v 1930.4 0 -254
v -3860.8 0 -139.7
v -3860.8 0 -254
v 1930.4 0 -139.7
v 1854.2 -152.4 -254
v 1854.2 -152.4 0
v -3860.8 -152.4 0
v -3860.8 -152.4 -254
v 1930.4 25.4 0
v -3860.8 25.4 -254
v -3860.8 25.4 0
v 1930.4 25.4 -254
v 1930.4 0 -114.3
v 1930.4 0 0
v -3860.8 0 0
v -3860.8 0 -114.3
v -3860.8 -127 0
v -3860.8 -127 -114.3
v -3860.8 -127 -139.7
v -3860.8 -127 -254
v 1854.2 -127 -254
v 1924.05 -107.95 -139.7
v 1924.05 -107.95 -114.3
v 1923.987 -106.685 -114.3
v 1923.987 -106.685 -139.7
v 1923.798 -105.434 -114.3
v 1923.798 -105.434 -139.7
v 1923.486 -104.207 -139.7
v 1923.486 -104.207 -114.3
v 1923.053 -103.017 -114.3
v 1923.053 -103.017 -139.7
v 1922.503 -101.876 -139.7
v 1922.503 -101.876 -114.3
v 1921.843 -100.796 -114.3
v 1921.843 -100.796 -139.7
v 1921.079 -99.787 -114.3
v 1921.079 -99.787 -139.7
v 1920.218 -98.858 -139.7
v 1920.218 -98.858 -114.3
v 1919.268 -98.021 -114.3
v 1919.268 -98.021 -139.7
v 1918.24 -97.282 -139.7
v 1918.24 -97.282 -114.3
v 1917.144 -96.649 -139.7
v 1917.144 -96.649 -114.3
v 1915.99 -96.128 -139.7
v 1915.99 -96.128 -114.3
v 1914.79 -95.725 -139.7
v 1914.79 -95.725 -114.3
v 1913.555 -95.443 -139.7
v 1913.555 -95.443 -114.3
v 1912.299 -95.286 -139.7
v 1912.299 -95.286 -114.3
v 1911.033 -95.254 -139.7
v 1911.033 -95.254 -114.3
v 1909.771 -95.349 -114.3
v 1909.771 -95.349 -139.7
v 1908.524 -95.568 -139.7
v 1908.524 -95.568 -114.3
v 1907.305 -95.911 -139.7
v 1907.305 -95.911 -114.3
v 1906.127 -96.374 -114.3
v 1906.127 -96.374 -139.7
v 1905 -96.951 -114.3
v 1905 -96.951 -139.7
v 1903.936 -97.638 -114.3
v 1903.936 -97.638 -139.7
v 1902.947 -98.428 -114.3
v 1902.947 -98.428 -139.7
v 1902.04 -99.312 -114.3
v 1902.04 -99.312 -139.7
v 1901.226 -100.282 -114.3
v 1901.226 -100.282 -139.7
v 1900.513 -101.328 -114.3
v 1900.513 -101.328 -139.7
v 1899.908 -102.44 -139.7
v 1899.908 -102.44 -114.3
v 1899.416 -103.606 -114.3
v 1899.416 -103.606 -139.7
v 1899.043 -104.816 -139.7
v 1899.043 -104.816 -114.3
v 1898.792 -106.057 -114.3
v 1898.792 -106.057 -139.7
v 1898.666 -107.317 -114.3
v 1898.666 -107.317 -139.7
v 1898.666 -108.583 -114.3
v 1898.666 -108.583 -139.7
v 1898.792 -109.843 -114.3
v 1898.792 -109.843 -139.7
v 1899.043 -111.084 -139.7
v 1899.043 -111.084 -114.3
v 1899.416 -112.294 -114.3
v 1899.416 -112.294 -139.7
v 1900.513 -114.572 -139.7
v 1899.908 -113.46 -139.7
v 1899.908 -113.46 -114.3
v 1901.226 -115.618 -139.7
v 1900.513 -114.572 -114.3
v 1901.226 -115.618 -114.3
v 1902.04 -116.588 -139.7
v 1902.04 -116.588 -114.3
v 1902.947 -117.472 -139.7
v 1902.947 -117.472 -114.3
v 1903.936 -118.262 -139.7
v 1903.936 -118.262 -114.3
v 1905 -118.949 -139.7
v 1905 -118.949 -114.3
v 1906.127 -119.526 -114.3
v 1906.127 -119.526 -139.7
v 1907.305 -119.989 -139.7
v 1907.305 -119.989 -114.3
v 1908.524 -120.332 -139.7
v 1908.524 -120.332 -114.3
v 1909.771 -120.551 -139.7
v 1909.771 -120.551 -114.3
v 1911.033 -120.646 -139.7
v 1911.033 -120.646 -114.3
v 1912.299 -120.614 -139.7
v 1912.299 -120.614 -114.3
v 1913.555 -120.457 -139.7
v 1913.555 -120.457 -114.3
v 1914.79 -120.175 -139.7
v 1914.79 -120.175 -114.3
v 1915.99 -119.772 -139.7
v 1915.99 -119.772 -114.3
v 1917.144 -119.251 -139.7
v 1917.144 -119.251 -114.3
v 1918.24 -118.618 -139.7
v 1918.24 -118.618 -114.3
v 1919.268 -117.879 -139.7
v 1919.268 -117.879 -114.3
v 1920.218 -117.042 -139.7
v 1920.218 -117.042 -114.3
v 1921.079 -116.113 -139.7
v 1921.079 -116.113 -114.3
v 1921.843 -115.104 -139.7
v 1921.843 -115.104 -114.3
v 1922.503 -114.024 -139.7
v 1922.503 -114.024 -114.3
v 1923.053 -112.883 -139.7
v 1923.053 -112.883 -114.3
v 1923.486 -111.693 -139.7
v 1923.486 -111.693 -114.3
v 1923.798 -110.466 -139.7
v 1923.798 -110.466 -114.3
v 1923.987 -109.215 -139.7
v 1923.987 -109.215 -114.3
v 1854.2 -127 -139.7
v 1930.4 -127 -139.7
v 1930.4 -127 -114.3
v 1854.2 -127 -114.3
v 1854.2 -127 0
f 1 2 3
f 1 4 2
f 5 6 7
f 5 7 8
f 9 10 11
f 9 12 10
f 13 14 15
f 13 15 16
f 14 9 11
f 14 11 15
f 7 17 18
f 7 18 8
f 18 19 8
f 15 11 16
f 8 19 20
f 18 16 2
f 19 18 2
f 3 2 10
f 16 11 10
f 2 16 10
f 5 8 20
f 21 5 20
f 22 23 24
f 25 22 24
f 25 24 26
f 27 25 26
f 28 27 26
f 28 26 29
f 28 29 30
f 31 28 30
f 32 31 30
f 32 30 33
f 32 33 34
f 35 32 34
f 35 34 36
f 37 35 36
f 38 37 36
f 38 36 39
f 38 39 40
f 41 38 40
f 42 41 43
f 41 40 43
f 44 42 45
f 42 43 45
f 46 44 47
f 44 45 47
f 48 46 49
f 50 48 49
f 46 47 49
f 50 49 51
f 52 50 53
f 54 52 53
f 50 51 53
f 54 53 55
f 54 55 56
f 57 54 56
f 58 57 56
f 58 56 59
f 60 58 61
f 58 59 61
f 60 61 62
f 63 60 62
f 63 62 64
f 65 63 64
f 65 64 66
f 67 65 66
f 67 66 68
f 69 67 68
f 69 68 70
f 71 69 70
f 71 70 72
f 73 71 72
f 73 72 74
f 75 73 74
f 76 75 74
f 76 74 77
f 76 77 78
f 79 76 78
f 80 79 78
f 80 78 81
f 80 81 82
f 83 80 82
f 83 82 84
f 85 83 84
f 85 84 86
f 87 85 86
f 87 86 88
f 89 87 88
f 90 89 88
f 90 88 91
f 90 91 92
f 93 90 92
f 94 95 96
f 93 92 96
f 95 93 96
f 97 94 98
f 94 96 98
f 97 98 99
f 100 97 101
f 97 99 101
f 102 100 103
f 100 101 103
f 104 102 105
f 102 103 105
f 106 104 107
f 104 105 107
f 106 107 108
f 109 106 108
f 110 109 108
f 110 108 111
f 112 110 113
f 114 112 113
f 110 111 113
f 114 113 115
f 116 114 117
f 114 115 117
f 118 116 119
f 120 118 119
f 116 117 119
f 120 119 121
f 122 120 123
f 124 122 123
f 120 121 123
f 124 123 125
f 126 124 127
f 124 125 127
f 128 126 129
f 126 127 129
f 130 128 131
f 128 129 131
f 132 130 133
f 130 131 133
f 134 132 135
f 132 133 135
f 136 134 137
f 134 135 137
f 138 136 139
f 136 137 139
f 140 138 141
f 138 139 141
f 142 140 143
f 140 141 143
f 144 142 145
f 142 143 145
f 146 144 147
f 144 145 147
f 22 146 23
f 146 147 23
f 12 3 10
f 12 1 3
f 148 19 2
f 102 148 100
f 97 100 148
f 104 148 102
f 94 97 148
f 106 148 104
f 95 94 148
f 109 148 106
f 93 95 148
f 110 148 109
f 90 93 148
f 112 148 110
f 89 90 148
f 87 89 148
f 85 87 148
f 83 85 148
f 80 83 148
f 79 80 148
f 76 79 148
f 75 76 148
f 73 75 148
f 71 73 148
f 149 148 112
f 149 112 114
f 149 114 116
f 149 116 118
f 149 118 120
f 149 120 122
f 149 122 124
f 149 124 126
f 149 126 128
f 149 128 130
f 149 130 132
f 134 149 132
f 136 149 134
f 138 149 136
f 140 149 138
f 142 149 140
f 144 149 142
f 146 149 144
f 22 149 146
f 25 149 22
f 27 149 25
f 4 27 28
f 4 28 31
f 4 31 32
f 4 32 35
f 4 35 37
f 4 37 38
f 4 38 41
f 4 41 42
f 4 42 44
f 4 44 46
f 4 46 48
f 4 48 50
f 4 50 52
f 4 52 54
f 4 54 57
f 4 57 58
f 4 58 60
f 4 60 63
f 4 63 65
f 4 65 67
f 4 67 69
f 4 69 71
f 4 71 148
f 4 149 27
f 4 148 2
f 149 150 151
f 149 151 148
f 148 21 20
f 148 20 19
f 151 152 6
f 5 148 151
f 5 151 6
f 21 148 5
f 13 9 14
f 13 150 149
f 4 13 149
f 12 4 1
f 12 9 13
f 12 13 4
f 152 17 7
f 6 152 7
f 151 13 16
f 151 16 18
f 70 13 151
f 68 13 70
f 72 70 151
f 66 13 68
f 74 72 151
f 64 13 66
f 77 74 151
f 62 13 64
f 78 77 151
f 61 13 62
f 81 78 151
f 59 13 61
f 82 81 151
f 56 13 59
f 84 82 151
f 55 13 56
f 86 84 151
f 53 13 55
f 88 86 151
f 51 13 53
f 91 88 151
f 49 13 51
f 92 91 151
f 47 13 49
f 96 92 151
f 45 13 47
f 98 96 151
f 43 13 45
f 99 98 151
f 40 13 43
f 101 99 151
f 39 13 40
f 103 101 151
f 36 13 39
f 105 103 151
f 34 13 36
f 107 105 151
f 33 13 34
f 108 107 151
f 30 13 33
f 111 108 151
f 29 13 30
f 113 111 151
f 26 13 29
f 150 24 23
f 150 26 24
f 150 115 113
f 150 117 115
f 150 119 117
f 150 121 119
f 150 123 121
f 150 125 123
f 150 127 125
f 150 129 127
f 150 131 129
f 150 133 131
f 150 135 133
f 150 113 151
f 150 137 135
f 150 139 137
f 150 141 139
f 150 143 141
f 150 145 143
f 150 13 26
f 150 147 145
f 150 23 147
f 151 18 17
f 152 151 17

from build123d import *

# Parameters (mm, degrees)
BOSS_EXTRUDE1_DEPTH = 1930.4
CUT_EXTRUDE1_REACH  = 1943.439
SKETCH2_R           = 12.7
SKETCH3_W           = 254
SKETCH3_H           = 25.4
CUT_EXTRUDE2_DEPTH  = 76.2
BOSS_EXTRUDE2_DEPTH = 3860.8


with BuildPart() as part:
    # Sketch1 → Boss-Extrude1 (new body)
    with BuildSketch(Plane(origin=(0, 0, 0), x_dir=(0, 0, -1), z_dir=(1, 0, 0))):
        Polygon((139.7, 0), (254, 0), (254, 25.4), (0, 25.4), (0, 0), (114.3, 0), (114.3, -127), (0, -127), (0, -152.4), (254, -152.4), (254, -127), (139.7, -127), align=None)
    extrude(amount=BOSS_EXTRUDE1_DEPTH)

    # Sketch2 → Cut-Extrude1 (cut, up to next)
    with BuildSketch(Plane.XY.offset(-114.3), mode=Mode.PRIVATE) as cut_extrude1_sk1:
        with Locations((1911.35, -107.95)):
            Circle(SKETCH2_R)
    cut_extrude1_tool1 = extrude(cut_extrude1_sk1.sketch, amount=-CUT_EXTRUDE1_REACH, mode=Mode.PRIVATE) & part.part
    add(cut_extrude1_tool1.solids().sort_by_distance((1911.35, -107.95, -114.3))[0], mode=Mode.SUBTRACT)

    # Sketch3 → Cut-Extrude2 (cut)
    with BuildSketch(Plane(origin=(1930.4, 0, 0), x_dir=(0, 0, -1), z_dir=(1, 0, 0))):
        with Locations((127, -139.7)):
            Rectangle(SKETCH3_W, SKETCH3_H)
    extrude(amount=-CUT_EXTRUDE2_DEPTH, mode=Mode.SUBTRACT)

    # Sketch5 → Boss-Extrude2 (add)
    with BuildSketch(Plane.ZY):
        Polygon((-254, 25.4), (0, 25.4), (0, 0), (-114.3, 0), (-114.3, -127), (0, -127), (0, -152.4), (-254, -152.4), (-254, -127), (-139.7, -127), (-139.7, 0), (-254, 0), align=None)
    extrude(amount=BOSS_EXTRUDE2_DEPTH)


solid = part.part
